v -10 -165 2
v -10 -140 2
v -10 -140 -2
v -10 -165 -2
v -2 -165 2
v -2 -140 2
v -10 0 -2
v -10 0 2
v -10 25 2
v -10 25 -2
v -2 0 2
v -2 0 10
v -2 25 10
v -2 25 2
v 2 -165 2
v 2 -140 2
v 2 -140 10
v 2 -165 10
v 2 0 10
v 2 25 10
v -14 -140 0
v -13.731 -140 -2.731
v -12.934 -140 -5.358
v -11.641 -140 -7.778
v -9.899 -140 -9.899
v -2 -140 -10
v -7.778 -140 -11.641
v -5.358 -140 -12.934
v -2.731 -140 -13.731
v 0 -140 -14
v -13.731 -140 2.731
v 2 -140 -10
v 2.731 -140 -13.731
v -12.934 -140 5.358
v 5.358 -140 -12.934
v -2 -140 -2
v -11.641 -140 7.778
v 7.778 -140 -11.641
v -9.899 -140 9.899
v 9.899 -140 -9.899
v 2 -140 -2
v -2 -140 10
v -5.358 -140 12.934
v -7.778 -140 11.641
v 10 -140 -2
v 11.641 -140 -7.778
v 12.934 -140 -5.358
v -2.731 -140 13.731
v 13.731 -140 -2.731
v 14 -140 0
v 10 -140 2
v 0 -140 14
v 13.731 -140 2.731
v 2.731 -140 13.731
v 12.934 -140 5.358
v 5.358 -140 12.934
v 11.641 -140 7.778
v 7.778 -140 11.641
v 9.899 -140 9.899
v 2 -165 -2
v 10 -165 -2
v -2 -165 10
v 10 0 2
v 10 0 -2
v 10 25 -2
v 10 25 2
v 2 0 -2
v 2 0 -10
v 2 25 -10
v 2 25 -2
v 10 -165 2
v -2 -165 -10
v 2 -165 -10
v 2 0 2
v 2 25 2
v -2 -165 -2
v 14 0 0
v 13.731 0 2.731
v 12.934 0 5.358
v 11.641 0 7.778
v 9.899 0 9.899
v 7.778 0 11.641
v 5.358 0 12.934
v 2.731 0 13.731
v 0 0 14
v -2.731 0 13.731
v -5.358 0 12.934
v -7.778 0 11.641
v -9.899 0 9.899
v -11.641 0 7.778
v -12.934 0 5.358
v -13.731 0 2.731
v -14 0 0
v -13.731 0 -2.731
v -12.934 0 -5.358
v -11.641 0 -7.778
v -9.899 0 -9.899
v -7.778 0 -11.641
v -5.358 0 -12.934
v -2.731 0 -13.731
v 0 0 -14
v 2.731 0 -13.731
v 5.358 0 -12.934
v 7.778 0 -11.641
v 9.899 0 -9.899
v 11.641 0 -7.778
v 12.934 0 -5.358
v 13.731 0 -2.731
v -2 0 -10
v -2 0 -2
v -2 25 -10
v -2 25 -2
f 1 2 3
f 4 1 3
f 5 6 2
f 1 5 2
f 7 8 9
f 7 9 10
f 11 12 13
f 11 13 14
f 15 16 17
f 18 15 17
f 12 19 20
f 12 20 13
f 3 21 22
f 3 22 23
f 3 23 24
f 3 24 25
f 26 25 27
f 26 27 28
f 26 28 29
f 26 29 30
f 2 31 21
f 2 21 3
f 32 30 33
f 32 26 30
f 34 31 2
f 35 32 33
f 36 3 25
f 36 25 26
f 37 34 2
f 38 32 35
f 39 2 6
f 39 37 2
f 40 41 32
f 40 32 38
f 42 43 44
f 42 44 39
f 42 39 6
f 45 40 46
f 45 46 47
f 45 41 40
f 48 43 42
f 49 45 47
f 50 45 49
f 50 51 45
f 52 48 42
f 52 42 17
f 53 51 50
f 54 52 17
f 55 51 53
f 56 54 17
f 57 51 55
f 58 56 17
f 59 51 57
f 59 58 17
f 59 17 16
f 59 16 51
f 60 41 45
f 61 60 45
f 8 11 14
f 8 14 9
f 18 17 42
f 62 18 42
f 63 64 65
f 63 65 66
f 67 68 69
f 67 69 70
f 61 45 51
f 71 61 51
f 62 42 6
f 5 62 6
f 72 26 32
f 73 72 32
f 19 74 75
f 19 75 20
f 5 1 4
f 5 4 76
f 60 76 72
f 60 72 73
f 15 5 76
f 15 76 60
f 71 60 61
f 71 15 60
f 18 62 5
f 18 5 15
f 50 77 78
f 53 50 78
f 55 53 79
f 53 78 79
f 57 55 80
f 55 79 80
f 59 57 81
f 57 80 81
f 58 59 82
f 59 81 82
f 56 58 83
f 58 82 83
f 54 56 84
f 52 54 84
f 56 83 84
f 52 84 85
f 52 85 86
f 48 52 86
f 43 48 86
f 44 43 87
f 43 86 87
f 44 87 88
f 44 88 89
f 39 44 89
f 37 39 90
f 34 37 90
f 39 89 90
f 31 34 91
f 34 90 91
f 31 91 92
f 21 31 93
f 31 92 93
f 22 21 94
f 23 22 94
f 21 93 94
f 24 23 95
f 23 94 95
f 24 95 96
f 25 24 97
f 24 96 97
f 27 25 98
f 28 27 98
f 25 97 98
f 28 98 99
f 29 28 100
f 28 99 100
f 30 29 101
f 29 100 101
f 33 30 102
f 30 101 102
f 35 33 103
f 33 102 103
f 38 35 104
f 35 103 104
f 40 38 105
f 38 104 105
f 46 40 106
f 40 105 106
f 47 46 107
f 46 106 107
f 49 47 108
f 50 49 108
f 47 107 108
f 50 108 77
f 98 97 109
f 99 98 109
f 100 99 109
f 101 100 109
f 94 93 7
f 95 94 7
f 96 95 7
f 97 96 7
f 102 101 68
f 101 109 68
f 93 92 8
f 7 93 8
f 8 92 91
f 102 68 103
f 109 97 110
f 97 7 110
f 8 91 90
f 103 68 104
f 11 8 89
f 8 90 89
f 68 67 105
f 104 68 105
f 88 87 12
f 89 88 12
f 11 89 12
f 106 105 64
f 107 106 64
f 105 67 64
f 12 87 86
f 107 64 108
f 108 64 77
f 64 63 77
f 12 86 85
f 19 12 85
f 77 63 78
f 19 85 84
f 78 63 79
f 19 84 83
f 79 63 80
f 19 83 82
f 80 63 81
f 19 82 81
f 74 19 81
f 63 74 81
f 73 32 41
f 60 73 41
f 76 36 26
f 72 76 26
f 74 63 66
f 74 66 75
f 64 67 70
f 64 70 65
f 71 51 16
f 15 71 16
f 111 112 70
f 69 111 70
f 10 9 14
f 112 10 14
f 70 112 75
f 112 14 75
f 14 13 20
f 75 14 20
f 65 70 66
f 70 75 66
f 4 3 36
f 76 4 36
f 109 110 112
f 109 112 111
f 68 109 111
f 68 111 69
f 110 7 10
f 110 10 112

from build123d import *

# Parameters (mm, degrees)
F0_R     = 14
F1_DEPTH = 140
F3_DEPTH = 25
F5_DEPTH = 25


with BuildPart() as f1:
    # F0 (on Front) → F1 (new body)
    with BuildSketch(Plane.XZ):
        Circle(F0_R)
    extrude(amount=F1_DEPTH)

    # F2 (on Front) → F3 (join)
    with BuildSketch(Plane.XZ):
        Polygon((2, 10), (-2, 10), (-2, 2), (-10, 2), (-10, -2), (-2, -2), (-2, -10), (2, -10), (2, -2), (10, -2), (10, 2), (2, 2), align=None)
    extrude(amount=-F3_DEPTH)

    # F4 (on face) → F5 (join)
    with BuildSketch(Plane.XZ.offset(140)):
        Polygon((-2, 2), (-10, 2), (-10, -2), (-2, -2), (-2, -10), (2, -10), (2, -2), (10, -2), (10, 2), (2, 2), (2, 10), (-2, 10), align=None)
    extrude(amount=F5_DEPTH)


solid = f1.part
